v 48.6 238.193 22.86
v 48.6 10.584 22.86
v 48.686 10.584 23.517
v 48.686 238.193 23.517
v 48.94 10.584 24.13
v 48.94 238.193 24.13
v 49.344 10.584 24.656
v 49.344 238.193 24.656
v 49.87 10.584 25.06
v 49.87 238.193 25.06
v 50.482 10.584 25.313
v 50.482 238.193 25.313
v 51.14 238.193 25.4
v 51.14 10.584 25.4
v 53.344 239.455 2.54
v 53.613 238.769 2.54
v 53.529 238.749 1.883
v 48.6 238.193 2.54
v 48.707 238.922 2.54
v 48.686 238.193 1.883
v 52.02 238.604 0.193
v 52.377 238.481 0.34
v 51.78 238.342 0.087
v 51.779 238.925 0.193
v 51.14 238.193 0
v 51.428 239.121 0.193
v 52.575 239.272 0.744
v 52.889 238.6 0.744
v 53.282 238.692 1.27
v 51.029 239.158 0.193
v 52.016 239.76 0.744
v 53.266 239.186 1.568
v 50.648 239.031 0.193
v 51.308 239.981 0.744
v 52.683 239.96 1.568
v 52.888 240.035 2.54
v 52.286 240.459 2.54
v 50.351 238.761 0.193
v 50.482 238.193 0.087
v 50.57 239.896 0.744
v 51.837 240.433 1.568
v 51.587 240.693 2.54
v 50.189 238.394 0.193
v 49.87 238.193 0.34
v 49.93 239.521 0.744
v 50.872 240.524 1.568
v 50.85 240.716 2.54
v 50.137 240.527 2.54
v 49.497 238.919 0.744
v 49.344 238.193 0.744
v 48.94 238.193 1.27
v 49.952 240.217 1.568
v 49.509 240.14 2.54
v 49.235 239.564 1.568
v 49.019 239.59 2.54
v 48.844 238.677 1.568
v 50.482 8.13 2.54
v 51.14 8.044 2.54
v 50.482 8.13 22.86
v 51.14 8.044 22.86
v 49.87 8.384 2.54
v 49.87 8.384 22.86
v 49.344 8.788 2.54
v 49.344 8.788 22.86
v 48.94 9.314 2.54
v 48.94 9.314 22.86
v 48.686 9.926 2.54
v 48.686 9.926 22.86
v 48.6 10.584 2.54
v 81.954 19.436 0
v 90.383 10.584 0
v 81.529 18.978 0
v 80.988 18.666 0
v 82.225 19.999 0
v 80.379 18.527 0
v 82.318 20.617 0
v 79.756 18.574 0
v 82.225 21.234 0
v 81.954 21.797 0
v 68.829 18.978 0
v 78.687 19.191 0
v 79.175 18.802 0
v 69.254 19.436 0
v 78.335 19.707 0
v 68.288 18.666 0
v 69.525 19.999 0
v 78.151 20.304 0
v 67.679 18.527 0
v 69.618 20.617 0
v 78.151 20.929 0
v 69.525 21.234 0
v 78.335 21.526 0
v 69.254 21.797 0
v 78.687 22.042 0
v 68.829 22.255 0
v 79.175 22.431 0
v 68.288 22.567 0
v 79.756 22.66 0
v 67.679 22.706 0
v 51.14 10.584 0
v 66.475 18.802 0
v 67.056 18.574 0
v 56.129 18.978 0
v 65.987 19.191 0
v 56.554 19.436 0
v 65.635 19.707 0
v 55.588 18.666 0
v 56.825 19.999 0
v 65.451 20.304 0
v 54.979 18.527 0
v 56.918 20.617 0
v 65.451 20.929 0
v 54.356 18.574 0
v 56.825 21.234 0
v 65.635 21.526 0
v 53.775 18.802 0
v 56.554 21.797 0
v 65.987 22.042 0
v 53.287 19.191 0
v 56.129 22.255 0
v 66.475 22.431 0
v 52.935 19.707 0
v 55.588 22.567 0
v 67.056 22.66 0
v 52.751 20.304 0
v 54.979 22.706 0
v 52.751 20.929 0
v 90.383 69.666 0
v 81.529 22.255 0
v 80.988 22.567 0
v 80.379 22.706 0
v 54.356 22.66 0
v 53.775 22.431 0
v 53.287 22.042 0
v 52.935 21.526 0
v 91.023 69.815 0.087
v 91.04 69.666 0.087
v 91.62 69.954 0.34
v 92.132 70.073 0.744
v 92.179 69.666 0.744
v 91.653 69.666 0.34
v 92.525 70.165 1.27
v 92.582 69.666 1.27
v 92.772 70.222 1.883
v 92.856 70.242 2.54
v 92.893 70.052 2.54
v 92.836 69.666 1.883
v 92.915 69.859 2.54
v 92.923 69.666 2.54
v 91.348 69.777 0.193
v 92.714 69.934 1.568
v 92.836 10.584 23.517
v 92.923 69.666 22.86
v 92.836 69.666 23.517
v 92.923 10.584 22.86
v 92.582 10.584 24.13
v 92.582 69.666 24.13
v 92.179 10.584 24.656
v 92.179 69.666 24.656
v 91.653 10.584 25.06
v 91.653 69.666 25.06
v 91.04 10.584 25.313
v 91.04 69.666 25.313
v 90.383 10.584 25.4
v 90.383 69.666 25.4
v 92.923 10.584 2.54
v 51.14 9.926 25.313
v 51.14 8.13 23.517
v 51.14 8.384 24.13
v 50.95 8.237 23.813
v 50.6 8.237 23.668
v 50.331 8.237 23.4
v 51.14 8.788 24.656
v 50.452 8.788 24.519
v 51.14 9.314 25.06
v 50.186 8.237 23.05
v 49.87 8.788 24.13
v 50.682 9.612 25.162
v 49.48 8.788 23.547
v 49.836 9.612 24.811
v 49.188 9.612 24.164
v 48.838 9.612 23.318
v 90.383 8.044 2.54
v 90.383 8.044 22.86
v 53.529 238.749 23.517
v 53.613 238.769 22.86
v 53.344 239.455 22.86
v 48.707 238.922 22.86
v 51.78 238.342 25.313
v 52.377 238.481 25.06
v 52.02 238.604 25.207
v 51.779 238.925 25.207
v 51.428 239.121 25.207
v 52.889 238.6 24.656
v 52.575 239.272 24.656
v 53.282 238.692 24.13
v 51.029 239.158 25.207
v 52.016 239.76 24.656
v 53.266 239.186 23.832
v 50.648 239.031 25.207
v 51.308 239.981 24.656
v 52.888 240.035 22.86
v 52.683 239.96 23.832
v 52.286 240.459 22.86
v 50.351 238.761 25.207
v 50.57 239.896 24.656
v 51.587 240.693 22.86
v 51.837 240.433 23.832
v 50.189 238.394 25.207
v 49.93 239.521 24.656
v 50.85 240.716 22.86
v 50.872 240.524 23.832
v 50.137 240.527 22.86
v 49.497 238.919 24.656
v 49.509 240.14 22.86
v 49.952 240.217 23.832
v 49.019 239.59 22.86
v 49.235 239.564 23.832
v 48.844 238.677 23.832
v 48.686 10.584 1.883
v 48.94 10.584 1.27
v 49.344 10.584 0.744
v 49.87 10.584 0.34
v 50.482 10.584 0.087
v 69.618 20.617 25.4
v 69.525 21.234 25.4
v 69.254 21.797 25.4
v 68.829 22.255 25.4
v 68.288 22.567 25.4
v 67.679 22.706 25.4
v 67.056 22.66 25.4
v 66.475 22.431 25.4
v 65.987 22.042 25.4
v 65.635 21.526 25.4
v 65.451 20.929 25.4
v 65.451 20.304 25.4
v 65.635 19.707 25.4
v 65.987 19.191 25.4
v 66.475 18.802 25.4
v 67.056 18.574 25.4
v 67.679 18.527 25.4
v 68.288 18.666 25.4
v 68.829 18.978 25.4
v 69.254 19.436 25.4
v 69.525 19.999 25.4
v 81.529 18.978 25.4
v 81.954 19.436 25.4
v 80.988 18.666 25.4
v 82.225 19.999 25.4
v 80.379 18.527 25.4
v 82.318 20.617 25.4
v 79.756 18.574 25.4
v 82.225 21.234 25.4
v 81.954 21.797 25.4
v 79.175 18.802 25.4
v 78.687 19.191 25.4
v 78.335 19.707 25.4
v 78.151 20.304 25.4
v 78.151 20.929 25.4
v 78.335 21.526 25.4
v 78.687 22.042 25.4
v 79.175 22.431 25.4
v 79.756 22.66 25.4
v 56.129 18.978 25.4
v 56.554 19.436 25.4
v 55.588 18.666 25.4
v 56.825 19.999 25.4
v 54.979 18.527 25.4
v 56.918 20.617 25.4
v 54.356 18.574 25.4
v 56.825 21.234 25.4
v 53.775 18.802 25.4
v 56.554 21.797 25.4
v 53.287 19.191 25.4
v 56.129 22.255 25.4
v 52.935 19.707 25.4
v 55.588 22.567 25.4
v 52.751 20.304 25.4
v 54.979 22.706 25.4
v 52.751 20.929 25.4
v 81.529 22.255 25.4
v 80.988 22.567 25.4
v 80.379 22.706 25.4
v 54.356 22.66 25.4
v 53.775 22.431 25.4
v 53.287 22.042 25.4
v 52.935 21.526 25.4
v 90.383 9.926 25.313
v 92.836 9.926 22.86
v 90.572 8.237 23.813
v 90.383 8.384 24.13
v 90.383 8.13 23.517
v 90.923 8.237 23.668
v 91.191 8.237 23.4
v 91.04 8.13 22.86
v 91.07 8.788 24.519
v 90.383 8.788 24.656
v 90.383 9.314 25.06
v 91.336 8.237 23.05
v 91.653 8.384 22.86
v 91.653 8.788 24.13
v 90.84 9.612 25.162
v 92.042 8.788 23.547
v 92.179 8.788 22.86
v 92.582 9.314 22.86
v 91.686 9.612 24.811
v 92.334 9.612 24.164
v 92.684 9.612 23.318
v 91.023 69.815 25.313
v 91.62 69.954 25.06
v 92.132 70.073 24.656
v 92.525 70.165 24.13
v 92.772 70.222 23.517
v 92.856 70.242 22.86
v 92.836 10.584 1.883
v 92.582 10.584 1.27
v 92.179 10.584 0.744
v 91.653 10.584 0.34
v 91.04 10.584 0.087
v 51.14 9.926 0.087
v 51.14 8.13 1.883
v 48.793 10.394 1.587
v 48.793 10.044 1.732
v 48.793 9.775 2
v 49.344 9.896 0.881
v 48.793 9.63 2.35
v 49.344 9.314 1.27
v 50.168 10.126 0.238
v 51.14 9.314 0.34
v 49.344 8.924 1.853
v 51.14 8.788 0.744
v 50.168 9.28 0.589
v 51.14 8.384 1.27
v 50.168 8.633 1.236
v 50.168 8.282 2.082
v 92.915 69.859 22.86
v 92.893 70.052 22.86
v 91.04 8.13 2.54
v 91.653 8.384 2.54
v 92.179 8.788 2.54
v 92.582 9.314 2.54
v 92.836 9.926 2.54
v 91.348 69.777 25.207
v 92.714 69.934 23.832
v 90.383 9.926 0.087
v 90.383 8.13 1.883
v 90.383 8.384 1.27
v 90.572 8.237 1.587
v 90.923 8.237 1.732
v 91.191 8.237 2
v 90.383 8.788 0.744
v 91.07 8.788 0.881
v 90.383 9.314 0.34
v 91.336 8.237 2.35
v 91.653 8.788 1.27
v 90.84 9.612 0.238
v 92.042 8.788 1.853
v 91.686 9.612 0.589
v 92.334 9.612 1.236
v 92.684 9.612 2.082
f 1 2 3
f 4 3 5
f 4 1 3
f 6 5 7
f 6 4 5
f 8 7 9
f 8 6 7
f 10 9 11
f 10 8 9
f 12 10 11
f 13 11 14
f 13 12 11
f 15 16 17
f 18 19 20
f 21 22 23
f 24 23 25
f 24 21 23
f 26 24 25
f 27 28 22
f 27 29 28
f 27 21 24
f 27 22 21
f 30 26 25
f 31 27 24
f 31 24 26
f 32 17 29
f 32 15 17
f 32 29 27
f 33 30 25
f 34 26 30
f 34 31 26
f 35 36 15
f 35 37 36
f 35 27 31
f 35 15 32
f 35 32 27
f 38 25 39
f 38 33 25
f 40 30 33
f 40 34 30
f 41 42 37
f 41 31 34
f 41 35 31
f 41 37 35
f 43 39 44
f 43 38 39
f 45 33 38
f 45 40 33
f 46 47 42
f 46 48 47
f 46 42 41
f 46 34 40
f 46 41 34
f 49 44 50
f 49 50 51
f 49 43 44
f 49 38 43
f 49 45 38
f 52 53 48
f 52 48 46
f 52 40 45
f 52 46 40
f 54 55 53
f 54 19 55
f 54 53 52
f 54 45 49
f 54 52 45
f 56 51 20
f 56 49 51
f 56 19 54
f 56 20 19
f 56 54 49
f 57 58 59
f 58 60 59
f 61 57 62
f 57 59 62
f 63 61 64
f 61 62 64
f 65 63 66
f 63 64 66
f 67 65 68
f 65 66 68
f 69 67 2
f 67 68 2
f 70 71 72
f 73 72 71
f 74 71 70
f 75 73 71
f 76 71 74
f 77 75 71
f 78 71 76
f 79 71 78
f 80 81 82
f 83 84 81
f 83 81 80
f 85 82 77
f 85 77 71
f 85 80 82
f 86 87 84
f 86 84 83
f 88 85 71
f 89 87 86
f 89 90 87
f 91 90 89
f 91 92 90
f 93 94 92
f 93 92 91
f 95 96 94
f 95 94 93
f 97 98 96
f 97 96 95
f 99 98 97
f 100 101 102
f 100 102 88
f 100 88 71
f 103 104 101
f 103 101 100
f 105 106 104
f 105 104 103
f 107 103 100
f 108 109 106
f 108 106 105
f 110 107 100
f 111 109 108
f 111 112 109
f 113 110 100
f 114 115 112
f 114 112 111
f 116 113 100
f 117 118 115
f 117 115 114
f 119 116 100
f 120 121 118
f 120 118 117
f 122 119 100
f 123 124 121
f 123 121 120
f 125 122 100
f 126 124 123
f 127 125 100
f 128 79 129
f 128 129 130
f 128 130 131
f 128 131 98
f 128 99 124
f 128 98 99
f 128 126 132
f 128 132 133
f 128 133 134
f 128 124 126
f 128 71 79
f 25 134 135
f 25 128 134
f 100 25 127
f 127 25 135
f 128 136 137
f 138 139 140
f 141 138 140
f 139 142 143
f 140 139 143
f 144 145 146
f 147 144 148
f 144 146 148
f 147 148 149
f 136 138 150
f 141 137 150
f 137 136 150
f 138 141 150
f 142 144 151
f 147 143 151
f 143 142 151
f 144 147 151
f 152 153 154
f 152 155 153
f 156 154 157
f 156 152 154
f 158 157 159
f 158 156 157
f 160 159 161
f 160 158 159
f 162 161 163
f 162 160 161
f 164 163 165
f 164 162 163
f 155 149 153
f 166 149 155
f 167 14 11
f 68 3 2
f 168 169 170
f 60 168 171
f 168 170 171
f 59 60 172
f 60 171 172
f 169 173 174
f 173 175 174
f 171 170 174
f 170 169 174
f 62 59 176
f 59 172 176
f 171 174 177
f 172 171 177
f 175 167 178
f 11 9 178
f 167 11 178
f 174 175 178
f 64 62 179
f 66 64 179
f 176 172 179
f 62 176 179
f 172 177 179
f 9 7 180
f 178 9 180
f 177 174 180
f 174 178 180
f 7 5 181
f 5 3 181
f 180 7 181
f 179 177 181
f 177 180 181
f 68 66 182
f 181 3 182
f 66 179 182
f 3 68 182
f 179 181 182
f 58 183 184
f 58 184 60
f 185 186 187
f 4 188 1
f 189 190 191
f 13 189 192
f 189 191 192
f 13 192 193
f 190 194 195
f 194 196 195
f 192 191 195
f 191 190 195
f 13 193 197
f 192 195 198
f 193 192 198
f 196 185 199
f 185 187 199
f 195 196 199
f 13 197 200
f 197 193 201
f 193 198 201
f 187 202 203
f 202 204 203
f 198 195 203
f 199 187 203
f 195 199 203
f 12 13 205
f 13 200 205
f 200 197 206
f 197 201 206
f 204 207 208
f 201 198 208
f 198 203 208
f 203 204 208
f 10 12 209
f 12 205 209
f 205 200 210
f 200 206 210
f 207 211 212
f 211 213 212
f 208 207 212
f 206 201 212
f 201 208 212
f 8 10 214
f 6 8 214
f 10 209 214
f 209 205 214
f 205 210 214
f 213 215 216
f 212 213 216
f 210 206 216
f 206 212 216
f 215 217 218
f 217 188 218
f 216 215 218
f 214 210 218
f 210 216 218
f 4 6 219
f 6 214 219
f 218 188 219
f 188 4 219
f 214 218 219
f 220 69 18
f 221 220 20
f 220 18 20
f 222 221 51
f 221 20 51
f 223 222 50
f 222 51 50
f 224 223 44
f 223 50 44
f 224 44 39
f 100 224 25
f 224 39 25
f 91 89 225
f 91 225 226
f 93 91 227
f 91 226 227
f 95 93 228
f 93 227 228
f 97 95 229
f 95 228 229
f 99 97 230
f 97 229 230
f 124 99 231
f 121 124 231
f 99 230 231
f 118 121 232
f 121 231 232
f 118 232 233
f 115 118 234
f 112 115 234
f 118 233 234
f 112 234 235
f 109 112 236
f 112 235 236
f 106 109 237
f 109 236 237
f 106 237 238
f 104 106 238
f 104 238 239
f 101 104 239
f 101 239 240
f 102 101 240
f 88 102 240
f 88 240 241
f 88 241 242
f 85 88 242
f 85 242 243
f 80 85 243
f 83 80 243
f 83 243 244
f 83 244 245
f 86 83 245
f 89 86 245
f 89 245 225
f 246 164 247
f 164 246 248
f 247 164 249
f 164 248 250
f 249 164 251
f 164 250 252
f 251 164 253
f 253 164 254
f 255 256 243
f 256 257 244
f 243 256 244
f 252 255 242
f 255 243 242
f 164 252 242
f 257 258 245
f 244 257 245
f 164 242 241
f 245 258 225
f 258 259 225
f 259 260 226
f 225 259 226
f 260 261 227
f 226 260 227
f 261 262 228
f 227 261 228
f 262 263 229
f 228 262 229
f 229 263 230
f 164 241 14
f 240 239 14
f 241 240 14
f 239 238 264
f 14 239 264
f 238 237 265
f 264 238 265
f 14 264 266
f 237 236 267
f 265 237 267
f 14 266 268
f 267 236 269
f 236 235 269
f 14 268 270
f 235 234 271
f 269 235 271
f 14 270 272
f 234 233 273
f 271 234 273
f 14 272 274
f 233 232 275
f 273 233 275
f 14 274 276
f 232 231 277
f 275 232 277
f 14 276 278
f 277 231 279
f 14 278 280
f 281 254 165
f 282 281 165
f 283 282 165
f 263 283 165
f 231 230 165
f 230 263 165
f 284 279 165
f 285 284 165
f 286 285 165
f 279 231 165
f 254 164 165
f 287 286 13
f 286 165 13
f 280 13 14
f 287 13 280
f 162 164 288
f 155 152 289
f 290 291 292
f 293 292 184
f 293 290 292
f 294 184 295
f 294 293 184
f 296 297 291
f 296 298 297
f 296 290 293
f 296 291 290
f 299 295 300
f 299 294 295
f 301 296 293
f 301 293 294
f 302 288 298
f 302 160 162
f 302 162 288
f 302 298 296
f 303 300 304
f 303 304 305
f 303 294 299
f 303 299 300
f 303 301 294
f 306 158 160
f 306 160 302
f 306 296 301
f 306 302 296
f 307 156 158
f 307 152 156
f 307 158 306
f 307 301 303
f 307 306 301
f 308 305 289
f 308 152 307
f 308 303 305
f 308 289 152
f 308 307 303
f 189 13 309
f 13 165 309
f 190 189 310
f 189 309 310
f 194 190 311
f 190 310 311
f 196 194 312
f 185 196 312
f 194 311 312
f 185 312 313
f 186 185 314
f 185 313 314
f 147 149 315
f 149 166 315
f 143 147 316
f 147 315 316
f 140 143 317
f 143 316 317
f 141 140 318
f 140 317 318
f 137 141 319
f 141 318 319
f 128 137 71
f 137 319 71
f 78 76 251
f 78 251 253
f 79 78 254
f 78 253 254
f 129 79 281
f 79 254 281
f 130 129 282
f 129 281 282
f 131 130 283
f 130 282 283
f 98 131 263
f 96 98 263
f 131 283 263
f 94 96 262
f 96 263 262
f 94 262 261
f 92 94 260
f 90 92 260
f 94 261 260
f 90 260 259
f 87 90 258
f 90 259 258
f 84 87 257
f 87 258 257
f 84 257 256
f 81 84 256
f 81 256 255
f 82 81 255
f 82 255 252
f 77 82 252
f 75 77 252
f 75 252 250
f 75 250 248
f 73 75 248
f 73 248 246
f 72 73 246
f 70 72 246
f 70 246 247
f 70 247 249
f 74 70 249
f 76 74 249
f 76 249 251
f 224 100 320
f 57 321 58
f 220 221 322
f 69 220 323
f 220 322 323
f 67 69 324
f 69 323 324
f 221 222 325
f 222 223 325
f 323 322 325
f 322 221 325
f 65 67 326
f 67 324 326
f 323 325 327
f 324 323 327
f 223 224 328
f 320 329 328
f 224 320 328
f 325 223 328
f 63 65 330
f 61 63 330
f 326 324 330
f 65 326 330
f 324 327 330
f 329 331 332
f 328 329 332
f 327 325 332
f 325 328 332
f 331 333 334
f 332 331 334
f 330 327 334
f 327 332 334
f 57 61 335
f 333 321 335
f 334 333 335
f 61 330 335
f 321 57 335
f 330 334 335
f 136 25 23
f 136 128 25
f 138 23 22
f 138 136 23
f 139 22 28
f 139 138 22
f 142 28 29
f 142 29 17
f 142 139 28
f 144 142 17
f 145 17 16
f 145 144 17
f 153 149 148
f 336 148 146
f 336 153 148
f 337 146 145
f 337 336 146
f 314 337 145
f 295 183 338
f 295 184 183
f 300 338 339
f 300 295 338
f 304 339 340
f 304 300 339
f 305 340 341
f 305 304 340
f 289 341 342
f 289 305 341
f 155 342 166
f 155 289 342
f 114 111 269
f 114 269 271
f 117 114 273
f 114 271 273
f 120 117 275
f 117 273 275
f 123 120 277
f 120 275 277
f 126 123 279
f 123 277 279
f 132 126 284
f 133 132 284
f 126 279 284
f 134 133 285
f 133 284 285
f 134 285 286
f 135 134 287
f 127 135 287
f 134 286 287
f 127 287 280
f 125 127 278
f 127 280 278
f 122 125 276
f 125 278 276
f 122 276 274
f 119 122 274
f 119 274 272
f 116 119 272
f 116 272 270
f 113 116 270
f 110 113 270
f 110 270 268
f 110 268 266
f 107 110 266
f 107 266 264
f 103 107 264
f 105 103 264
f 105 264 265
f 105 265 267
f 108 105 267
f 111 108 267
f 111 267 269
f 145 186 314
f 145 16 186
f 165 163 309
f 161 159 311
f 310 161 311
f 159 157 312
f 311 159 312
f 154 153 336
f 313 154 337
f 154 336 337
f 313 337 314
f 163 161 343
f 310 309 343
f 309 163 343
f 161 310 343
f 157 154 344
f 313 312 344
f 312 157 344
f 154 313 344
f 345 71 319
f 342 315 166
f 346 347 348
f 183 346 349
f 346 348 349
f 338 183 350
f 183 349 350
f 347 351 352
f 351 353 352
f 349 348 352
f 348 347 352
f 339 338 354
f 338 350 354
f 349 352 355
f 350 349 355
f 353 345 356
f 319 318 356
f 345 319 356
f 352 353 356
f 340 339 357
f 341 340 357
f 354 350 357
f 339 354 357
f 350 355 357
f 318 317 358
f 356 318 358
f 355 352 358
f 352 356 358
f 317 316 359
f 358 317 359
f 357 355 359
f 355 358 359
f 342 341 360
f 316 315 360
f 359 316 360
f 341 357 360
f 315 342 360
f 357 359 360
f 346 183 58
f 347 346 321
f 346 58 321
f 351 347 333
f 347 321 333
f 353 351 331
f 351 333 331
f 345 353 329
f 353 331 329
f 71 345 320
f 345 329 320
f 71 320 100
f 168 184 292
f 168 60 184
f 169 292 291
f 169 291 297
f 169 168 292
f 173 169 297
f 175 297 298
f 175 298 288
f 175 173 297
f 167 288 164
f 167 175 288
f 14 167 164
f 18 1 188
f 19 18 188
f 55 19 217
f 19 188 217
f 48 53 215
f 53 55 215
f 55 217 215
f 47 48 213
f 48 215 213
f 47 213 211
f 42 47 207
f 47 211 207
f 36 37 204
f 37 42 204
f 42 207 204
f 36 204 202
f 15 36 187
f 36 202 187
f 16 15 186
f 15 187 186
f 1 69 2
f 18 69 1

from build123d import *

# Parameters (mm, degrees)
BOSS_EXTRUDE2_DEPTH   = 25.4
F_8_CLEARANCE_HOLE1_D = 4.191
FILLET1_R             = 2.54


with BuildPart() as part:
    # Sketch2 → Boss-Extrude2 (new body)
    with BuildSketch(Plane.XY):
        Polygon((92.922616299, 8.043671593), (48.599616303, 8.043671593), (48.599616303, 260.300358649), (92.922616299, 69.957537027), align=None)
    extrude(amount=BOSS_EXTRUDE2_DEPTH)

    # #8 Clearance Hole1 (through all)
    with Locations(Plane(origin=(0, 0, 0), x_dir=(-1, 0, 0), z_dir=(0, 0, -1))):
        with Locations((-80.22261633, 20.616671539), (-67.52261633, 20.616671539), (-54.82261633, 20.616671539)):
            Hole(F_8_CLEARANCE_HOLE1_D / 2)

    # Fillet1
    fillet1_edges = [part.edges().sort_by_distance(p)[0] for p in [
        (92.922616299, 39.00060431, 25.4),
        (70.761116301, 165.128947838, 25.4),
        (48.599616303, 134.172015121, 25.4),
        (70.761116301, 165.128947838, 0),
        (92.922616299, 39.00060431, 0),
        (70.761116301, 8.043671593, 0),
        (48.599616303, 134.172015121, 0),
        (70.761116301, 8.043671593, 25.4),
        (48.599616303, 260.300358649, 12.7),
        (92.922616299, 69.957537027, 12.7),
        (92.922616299, 8.043671593, 12.7),
        (48.599616303, 8.043671593, 12.7),
    ]]
    fillet(fillet1_edges, radius=FILLET1_R)


solid = part.part
